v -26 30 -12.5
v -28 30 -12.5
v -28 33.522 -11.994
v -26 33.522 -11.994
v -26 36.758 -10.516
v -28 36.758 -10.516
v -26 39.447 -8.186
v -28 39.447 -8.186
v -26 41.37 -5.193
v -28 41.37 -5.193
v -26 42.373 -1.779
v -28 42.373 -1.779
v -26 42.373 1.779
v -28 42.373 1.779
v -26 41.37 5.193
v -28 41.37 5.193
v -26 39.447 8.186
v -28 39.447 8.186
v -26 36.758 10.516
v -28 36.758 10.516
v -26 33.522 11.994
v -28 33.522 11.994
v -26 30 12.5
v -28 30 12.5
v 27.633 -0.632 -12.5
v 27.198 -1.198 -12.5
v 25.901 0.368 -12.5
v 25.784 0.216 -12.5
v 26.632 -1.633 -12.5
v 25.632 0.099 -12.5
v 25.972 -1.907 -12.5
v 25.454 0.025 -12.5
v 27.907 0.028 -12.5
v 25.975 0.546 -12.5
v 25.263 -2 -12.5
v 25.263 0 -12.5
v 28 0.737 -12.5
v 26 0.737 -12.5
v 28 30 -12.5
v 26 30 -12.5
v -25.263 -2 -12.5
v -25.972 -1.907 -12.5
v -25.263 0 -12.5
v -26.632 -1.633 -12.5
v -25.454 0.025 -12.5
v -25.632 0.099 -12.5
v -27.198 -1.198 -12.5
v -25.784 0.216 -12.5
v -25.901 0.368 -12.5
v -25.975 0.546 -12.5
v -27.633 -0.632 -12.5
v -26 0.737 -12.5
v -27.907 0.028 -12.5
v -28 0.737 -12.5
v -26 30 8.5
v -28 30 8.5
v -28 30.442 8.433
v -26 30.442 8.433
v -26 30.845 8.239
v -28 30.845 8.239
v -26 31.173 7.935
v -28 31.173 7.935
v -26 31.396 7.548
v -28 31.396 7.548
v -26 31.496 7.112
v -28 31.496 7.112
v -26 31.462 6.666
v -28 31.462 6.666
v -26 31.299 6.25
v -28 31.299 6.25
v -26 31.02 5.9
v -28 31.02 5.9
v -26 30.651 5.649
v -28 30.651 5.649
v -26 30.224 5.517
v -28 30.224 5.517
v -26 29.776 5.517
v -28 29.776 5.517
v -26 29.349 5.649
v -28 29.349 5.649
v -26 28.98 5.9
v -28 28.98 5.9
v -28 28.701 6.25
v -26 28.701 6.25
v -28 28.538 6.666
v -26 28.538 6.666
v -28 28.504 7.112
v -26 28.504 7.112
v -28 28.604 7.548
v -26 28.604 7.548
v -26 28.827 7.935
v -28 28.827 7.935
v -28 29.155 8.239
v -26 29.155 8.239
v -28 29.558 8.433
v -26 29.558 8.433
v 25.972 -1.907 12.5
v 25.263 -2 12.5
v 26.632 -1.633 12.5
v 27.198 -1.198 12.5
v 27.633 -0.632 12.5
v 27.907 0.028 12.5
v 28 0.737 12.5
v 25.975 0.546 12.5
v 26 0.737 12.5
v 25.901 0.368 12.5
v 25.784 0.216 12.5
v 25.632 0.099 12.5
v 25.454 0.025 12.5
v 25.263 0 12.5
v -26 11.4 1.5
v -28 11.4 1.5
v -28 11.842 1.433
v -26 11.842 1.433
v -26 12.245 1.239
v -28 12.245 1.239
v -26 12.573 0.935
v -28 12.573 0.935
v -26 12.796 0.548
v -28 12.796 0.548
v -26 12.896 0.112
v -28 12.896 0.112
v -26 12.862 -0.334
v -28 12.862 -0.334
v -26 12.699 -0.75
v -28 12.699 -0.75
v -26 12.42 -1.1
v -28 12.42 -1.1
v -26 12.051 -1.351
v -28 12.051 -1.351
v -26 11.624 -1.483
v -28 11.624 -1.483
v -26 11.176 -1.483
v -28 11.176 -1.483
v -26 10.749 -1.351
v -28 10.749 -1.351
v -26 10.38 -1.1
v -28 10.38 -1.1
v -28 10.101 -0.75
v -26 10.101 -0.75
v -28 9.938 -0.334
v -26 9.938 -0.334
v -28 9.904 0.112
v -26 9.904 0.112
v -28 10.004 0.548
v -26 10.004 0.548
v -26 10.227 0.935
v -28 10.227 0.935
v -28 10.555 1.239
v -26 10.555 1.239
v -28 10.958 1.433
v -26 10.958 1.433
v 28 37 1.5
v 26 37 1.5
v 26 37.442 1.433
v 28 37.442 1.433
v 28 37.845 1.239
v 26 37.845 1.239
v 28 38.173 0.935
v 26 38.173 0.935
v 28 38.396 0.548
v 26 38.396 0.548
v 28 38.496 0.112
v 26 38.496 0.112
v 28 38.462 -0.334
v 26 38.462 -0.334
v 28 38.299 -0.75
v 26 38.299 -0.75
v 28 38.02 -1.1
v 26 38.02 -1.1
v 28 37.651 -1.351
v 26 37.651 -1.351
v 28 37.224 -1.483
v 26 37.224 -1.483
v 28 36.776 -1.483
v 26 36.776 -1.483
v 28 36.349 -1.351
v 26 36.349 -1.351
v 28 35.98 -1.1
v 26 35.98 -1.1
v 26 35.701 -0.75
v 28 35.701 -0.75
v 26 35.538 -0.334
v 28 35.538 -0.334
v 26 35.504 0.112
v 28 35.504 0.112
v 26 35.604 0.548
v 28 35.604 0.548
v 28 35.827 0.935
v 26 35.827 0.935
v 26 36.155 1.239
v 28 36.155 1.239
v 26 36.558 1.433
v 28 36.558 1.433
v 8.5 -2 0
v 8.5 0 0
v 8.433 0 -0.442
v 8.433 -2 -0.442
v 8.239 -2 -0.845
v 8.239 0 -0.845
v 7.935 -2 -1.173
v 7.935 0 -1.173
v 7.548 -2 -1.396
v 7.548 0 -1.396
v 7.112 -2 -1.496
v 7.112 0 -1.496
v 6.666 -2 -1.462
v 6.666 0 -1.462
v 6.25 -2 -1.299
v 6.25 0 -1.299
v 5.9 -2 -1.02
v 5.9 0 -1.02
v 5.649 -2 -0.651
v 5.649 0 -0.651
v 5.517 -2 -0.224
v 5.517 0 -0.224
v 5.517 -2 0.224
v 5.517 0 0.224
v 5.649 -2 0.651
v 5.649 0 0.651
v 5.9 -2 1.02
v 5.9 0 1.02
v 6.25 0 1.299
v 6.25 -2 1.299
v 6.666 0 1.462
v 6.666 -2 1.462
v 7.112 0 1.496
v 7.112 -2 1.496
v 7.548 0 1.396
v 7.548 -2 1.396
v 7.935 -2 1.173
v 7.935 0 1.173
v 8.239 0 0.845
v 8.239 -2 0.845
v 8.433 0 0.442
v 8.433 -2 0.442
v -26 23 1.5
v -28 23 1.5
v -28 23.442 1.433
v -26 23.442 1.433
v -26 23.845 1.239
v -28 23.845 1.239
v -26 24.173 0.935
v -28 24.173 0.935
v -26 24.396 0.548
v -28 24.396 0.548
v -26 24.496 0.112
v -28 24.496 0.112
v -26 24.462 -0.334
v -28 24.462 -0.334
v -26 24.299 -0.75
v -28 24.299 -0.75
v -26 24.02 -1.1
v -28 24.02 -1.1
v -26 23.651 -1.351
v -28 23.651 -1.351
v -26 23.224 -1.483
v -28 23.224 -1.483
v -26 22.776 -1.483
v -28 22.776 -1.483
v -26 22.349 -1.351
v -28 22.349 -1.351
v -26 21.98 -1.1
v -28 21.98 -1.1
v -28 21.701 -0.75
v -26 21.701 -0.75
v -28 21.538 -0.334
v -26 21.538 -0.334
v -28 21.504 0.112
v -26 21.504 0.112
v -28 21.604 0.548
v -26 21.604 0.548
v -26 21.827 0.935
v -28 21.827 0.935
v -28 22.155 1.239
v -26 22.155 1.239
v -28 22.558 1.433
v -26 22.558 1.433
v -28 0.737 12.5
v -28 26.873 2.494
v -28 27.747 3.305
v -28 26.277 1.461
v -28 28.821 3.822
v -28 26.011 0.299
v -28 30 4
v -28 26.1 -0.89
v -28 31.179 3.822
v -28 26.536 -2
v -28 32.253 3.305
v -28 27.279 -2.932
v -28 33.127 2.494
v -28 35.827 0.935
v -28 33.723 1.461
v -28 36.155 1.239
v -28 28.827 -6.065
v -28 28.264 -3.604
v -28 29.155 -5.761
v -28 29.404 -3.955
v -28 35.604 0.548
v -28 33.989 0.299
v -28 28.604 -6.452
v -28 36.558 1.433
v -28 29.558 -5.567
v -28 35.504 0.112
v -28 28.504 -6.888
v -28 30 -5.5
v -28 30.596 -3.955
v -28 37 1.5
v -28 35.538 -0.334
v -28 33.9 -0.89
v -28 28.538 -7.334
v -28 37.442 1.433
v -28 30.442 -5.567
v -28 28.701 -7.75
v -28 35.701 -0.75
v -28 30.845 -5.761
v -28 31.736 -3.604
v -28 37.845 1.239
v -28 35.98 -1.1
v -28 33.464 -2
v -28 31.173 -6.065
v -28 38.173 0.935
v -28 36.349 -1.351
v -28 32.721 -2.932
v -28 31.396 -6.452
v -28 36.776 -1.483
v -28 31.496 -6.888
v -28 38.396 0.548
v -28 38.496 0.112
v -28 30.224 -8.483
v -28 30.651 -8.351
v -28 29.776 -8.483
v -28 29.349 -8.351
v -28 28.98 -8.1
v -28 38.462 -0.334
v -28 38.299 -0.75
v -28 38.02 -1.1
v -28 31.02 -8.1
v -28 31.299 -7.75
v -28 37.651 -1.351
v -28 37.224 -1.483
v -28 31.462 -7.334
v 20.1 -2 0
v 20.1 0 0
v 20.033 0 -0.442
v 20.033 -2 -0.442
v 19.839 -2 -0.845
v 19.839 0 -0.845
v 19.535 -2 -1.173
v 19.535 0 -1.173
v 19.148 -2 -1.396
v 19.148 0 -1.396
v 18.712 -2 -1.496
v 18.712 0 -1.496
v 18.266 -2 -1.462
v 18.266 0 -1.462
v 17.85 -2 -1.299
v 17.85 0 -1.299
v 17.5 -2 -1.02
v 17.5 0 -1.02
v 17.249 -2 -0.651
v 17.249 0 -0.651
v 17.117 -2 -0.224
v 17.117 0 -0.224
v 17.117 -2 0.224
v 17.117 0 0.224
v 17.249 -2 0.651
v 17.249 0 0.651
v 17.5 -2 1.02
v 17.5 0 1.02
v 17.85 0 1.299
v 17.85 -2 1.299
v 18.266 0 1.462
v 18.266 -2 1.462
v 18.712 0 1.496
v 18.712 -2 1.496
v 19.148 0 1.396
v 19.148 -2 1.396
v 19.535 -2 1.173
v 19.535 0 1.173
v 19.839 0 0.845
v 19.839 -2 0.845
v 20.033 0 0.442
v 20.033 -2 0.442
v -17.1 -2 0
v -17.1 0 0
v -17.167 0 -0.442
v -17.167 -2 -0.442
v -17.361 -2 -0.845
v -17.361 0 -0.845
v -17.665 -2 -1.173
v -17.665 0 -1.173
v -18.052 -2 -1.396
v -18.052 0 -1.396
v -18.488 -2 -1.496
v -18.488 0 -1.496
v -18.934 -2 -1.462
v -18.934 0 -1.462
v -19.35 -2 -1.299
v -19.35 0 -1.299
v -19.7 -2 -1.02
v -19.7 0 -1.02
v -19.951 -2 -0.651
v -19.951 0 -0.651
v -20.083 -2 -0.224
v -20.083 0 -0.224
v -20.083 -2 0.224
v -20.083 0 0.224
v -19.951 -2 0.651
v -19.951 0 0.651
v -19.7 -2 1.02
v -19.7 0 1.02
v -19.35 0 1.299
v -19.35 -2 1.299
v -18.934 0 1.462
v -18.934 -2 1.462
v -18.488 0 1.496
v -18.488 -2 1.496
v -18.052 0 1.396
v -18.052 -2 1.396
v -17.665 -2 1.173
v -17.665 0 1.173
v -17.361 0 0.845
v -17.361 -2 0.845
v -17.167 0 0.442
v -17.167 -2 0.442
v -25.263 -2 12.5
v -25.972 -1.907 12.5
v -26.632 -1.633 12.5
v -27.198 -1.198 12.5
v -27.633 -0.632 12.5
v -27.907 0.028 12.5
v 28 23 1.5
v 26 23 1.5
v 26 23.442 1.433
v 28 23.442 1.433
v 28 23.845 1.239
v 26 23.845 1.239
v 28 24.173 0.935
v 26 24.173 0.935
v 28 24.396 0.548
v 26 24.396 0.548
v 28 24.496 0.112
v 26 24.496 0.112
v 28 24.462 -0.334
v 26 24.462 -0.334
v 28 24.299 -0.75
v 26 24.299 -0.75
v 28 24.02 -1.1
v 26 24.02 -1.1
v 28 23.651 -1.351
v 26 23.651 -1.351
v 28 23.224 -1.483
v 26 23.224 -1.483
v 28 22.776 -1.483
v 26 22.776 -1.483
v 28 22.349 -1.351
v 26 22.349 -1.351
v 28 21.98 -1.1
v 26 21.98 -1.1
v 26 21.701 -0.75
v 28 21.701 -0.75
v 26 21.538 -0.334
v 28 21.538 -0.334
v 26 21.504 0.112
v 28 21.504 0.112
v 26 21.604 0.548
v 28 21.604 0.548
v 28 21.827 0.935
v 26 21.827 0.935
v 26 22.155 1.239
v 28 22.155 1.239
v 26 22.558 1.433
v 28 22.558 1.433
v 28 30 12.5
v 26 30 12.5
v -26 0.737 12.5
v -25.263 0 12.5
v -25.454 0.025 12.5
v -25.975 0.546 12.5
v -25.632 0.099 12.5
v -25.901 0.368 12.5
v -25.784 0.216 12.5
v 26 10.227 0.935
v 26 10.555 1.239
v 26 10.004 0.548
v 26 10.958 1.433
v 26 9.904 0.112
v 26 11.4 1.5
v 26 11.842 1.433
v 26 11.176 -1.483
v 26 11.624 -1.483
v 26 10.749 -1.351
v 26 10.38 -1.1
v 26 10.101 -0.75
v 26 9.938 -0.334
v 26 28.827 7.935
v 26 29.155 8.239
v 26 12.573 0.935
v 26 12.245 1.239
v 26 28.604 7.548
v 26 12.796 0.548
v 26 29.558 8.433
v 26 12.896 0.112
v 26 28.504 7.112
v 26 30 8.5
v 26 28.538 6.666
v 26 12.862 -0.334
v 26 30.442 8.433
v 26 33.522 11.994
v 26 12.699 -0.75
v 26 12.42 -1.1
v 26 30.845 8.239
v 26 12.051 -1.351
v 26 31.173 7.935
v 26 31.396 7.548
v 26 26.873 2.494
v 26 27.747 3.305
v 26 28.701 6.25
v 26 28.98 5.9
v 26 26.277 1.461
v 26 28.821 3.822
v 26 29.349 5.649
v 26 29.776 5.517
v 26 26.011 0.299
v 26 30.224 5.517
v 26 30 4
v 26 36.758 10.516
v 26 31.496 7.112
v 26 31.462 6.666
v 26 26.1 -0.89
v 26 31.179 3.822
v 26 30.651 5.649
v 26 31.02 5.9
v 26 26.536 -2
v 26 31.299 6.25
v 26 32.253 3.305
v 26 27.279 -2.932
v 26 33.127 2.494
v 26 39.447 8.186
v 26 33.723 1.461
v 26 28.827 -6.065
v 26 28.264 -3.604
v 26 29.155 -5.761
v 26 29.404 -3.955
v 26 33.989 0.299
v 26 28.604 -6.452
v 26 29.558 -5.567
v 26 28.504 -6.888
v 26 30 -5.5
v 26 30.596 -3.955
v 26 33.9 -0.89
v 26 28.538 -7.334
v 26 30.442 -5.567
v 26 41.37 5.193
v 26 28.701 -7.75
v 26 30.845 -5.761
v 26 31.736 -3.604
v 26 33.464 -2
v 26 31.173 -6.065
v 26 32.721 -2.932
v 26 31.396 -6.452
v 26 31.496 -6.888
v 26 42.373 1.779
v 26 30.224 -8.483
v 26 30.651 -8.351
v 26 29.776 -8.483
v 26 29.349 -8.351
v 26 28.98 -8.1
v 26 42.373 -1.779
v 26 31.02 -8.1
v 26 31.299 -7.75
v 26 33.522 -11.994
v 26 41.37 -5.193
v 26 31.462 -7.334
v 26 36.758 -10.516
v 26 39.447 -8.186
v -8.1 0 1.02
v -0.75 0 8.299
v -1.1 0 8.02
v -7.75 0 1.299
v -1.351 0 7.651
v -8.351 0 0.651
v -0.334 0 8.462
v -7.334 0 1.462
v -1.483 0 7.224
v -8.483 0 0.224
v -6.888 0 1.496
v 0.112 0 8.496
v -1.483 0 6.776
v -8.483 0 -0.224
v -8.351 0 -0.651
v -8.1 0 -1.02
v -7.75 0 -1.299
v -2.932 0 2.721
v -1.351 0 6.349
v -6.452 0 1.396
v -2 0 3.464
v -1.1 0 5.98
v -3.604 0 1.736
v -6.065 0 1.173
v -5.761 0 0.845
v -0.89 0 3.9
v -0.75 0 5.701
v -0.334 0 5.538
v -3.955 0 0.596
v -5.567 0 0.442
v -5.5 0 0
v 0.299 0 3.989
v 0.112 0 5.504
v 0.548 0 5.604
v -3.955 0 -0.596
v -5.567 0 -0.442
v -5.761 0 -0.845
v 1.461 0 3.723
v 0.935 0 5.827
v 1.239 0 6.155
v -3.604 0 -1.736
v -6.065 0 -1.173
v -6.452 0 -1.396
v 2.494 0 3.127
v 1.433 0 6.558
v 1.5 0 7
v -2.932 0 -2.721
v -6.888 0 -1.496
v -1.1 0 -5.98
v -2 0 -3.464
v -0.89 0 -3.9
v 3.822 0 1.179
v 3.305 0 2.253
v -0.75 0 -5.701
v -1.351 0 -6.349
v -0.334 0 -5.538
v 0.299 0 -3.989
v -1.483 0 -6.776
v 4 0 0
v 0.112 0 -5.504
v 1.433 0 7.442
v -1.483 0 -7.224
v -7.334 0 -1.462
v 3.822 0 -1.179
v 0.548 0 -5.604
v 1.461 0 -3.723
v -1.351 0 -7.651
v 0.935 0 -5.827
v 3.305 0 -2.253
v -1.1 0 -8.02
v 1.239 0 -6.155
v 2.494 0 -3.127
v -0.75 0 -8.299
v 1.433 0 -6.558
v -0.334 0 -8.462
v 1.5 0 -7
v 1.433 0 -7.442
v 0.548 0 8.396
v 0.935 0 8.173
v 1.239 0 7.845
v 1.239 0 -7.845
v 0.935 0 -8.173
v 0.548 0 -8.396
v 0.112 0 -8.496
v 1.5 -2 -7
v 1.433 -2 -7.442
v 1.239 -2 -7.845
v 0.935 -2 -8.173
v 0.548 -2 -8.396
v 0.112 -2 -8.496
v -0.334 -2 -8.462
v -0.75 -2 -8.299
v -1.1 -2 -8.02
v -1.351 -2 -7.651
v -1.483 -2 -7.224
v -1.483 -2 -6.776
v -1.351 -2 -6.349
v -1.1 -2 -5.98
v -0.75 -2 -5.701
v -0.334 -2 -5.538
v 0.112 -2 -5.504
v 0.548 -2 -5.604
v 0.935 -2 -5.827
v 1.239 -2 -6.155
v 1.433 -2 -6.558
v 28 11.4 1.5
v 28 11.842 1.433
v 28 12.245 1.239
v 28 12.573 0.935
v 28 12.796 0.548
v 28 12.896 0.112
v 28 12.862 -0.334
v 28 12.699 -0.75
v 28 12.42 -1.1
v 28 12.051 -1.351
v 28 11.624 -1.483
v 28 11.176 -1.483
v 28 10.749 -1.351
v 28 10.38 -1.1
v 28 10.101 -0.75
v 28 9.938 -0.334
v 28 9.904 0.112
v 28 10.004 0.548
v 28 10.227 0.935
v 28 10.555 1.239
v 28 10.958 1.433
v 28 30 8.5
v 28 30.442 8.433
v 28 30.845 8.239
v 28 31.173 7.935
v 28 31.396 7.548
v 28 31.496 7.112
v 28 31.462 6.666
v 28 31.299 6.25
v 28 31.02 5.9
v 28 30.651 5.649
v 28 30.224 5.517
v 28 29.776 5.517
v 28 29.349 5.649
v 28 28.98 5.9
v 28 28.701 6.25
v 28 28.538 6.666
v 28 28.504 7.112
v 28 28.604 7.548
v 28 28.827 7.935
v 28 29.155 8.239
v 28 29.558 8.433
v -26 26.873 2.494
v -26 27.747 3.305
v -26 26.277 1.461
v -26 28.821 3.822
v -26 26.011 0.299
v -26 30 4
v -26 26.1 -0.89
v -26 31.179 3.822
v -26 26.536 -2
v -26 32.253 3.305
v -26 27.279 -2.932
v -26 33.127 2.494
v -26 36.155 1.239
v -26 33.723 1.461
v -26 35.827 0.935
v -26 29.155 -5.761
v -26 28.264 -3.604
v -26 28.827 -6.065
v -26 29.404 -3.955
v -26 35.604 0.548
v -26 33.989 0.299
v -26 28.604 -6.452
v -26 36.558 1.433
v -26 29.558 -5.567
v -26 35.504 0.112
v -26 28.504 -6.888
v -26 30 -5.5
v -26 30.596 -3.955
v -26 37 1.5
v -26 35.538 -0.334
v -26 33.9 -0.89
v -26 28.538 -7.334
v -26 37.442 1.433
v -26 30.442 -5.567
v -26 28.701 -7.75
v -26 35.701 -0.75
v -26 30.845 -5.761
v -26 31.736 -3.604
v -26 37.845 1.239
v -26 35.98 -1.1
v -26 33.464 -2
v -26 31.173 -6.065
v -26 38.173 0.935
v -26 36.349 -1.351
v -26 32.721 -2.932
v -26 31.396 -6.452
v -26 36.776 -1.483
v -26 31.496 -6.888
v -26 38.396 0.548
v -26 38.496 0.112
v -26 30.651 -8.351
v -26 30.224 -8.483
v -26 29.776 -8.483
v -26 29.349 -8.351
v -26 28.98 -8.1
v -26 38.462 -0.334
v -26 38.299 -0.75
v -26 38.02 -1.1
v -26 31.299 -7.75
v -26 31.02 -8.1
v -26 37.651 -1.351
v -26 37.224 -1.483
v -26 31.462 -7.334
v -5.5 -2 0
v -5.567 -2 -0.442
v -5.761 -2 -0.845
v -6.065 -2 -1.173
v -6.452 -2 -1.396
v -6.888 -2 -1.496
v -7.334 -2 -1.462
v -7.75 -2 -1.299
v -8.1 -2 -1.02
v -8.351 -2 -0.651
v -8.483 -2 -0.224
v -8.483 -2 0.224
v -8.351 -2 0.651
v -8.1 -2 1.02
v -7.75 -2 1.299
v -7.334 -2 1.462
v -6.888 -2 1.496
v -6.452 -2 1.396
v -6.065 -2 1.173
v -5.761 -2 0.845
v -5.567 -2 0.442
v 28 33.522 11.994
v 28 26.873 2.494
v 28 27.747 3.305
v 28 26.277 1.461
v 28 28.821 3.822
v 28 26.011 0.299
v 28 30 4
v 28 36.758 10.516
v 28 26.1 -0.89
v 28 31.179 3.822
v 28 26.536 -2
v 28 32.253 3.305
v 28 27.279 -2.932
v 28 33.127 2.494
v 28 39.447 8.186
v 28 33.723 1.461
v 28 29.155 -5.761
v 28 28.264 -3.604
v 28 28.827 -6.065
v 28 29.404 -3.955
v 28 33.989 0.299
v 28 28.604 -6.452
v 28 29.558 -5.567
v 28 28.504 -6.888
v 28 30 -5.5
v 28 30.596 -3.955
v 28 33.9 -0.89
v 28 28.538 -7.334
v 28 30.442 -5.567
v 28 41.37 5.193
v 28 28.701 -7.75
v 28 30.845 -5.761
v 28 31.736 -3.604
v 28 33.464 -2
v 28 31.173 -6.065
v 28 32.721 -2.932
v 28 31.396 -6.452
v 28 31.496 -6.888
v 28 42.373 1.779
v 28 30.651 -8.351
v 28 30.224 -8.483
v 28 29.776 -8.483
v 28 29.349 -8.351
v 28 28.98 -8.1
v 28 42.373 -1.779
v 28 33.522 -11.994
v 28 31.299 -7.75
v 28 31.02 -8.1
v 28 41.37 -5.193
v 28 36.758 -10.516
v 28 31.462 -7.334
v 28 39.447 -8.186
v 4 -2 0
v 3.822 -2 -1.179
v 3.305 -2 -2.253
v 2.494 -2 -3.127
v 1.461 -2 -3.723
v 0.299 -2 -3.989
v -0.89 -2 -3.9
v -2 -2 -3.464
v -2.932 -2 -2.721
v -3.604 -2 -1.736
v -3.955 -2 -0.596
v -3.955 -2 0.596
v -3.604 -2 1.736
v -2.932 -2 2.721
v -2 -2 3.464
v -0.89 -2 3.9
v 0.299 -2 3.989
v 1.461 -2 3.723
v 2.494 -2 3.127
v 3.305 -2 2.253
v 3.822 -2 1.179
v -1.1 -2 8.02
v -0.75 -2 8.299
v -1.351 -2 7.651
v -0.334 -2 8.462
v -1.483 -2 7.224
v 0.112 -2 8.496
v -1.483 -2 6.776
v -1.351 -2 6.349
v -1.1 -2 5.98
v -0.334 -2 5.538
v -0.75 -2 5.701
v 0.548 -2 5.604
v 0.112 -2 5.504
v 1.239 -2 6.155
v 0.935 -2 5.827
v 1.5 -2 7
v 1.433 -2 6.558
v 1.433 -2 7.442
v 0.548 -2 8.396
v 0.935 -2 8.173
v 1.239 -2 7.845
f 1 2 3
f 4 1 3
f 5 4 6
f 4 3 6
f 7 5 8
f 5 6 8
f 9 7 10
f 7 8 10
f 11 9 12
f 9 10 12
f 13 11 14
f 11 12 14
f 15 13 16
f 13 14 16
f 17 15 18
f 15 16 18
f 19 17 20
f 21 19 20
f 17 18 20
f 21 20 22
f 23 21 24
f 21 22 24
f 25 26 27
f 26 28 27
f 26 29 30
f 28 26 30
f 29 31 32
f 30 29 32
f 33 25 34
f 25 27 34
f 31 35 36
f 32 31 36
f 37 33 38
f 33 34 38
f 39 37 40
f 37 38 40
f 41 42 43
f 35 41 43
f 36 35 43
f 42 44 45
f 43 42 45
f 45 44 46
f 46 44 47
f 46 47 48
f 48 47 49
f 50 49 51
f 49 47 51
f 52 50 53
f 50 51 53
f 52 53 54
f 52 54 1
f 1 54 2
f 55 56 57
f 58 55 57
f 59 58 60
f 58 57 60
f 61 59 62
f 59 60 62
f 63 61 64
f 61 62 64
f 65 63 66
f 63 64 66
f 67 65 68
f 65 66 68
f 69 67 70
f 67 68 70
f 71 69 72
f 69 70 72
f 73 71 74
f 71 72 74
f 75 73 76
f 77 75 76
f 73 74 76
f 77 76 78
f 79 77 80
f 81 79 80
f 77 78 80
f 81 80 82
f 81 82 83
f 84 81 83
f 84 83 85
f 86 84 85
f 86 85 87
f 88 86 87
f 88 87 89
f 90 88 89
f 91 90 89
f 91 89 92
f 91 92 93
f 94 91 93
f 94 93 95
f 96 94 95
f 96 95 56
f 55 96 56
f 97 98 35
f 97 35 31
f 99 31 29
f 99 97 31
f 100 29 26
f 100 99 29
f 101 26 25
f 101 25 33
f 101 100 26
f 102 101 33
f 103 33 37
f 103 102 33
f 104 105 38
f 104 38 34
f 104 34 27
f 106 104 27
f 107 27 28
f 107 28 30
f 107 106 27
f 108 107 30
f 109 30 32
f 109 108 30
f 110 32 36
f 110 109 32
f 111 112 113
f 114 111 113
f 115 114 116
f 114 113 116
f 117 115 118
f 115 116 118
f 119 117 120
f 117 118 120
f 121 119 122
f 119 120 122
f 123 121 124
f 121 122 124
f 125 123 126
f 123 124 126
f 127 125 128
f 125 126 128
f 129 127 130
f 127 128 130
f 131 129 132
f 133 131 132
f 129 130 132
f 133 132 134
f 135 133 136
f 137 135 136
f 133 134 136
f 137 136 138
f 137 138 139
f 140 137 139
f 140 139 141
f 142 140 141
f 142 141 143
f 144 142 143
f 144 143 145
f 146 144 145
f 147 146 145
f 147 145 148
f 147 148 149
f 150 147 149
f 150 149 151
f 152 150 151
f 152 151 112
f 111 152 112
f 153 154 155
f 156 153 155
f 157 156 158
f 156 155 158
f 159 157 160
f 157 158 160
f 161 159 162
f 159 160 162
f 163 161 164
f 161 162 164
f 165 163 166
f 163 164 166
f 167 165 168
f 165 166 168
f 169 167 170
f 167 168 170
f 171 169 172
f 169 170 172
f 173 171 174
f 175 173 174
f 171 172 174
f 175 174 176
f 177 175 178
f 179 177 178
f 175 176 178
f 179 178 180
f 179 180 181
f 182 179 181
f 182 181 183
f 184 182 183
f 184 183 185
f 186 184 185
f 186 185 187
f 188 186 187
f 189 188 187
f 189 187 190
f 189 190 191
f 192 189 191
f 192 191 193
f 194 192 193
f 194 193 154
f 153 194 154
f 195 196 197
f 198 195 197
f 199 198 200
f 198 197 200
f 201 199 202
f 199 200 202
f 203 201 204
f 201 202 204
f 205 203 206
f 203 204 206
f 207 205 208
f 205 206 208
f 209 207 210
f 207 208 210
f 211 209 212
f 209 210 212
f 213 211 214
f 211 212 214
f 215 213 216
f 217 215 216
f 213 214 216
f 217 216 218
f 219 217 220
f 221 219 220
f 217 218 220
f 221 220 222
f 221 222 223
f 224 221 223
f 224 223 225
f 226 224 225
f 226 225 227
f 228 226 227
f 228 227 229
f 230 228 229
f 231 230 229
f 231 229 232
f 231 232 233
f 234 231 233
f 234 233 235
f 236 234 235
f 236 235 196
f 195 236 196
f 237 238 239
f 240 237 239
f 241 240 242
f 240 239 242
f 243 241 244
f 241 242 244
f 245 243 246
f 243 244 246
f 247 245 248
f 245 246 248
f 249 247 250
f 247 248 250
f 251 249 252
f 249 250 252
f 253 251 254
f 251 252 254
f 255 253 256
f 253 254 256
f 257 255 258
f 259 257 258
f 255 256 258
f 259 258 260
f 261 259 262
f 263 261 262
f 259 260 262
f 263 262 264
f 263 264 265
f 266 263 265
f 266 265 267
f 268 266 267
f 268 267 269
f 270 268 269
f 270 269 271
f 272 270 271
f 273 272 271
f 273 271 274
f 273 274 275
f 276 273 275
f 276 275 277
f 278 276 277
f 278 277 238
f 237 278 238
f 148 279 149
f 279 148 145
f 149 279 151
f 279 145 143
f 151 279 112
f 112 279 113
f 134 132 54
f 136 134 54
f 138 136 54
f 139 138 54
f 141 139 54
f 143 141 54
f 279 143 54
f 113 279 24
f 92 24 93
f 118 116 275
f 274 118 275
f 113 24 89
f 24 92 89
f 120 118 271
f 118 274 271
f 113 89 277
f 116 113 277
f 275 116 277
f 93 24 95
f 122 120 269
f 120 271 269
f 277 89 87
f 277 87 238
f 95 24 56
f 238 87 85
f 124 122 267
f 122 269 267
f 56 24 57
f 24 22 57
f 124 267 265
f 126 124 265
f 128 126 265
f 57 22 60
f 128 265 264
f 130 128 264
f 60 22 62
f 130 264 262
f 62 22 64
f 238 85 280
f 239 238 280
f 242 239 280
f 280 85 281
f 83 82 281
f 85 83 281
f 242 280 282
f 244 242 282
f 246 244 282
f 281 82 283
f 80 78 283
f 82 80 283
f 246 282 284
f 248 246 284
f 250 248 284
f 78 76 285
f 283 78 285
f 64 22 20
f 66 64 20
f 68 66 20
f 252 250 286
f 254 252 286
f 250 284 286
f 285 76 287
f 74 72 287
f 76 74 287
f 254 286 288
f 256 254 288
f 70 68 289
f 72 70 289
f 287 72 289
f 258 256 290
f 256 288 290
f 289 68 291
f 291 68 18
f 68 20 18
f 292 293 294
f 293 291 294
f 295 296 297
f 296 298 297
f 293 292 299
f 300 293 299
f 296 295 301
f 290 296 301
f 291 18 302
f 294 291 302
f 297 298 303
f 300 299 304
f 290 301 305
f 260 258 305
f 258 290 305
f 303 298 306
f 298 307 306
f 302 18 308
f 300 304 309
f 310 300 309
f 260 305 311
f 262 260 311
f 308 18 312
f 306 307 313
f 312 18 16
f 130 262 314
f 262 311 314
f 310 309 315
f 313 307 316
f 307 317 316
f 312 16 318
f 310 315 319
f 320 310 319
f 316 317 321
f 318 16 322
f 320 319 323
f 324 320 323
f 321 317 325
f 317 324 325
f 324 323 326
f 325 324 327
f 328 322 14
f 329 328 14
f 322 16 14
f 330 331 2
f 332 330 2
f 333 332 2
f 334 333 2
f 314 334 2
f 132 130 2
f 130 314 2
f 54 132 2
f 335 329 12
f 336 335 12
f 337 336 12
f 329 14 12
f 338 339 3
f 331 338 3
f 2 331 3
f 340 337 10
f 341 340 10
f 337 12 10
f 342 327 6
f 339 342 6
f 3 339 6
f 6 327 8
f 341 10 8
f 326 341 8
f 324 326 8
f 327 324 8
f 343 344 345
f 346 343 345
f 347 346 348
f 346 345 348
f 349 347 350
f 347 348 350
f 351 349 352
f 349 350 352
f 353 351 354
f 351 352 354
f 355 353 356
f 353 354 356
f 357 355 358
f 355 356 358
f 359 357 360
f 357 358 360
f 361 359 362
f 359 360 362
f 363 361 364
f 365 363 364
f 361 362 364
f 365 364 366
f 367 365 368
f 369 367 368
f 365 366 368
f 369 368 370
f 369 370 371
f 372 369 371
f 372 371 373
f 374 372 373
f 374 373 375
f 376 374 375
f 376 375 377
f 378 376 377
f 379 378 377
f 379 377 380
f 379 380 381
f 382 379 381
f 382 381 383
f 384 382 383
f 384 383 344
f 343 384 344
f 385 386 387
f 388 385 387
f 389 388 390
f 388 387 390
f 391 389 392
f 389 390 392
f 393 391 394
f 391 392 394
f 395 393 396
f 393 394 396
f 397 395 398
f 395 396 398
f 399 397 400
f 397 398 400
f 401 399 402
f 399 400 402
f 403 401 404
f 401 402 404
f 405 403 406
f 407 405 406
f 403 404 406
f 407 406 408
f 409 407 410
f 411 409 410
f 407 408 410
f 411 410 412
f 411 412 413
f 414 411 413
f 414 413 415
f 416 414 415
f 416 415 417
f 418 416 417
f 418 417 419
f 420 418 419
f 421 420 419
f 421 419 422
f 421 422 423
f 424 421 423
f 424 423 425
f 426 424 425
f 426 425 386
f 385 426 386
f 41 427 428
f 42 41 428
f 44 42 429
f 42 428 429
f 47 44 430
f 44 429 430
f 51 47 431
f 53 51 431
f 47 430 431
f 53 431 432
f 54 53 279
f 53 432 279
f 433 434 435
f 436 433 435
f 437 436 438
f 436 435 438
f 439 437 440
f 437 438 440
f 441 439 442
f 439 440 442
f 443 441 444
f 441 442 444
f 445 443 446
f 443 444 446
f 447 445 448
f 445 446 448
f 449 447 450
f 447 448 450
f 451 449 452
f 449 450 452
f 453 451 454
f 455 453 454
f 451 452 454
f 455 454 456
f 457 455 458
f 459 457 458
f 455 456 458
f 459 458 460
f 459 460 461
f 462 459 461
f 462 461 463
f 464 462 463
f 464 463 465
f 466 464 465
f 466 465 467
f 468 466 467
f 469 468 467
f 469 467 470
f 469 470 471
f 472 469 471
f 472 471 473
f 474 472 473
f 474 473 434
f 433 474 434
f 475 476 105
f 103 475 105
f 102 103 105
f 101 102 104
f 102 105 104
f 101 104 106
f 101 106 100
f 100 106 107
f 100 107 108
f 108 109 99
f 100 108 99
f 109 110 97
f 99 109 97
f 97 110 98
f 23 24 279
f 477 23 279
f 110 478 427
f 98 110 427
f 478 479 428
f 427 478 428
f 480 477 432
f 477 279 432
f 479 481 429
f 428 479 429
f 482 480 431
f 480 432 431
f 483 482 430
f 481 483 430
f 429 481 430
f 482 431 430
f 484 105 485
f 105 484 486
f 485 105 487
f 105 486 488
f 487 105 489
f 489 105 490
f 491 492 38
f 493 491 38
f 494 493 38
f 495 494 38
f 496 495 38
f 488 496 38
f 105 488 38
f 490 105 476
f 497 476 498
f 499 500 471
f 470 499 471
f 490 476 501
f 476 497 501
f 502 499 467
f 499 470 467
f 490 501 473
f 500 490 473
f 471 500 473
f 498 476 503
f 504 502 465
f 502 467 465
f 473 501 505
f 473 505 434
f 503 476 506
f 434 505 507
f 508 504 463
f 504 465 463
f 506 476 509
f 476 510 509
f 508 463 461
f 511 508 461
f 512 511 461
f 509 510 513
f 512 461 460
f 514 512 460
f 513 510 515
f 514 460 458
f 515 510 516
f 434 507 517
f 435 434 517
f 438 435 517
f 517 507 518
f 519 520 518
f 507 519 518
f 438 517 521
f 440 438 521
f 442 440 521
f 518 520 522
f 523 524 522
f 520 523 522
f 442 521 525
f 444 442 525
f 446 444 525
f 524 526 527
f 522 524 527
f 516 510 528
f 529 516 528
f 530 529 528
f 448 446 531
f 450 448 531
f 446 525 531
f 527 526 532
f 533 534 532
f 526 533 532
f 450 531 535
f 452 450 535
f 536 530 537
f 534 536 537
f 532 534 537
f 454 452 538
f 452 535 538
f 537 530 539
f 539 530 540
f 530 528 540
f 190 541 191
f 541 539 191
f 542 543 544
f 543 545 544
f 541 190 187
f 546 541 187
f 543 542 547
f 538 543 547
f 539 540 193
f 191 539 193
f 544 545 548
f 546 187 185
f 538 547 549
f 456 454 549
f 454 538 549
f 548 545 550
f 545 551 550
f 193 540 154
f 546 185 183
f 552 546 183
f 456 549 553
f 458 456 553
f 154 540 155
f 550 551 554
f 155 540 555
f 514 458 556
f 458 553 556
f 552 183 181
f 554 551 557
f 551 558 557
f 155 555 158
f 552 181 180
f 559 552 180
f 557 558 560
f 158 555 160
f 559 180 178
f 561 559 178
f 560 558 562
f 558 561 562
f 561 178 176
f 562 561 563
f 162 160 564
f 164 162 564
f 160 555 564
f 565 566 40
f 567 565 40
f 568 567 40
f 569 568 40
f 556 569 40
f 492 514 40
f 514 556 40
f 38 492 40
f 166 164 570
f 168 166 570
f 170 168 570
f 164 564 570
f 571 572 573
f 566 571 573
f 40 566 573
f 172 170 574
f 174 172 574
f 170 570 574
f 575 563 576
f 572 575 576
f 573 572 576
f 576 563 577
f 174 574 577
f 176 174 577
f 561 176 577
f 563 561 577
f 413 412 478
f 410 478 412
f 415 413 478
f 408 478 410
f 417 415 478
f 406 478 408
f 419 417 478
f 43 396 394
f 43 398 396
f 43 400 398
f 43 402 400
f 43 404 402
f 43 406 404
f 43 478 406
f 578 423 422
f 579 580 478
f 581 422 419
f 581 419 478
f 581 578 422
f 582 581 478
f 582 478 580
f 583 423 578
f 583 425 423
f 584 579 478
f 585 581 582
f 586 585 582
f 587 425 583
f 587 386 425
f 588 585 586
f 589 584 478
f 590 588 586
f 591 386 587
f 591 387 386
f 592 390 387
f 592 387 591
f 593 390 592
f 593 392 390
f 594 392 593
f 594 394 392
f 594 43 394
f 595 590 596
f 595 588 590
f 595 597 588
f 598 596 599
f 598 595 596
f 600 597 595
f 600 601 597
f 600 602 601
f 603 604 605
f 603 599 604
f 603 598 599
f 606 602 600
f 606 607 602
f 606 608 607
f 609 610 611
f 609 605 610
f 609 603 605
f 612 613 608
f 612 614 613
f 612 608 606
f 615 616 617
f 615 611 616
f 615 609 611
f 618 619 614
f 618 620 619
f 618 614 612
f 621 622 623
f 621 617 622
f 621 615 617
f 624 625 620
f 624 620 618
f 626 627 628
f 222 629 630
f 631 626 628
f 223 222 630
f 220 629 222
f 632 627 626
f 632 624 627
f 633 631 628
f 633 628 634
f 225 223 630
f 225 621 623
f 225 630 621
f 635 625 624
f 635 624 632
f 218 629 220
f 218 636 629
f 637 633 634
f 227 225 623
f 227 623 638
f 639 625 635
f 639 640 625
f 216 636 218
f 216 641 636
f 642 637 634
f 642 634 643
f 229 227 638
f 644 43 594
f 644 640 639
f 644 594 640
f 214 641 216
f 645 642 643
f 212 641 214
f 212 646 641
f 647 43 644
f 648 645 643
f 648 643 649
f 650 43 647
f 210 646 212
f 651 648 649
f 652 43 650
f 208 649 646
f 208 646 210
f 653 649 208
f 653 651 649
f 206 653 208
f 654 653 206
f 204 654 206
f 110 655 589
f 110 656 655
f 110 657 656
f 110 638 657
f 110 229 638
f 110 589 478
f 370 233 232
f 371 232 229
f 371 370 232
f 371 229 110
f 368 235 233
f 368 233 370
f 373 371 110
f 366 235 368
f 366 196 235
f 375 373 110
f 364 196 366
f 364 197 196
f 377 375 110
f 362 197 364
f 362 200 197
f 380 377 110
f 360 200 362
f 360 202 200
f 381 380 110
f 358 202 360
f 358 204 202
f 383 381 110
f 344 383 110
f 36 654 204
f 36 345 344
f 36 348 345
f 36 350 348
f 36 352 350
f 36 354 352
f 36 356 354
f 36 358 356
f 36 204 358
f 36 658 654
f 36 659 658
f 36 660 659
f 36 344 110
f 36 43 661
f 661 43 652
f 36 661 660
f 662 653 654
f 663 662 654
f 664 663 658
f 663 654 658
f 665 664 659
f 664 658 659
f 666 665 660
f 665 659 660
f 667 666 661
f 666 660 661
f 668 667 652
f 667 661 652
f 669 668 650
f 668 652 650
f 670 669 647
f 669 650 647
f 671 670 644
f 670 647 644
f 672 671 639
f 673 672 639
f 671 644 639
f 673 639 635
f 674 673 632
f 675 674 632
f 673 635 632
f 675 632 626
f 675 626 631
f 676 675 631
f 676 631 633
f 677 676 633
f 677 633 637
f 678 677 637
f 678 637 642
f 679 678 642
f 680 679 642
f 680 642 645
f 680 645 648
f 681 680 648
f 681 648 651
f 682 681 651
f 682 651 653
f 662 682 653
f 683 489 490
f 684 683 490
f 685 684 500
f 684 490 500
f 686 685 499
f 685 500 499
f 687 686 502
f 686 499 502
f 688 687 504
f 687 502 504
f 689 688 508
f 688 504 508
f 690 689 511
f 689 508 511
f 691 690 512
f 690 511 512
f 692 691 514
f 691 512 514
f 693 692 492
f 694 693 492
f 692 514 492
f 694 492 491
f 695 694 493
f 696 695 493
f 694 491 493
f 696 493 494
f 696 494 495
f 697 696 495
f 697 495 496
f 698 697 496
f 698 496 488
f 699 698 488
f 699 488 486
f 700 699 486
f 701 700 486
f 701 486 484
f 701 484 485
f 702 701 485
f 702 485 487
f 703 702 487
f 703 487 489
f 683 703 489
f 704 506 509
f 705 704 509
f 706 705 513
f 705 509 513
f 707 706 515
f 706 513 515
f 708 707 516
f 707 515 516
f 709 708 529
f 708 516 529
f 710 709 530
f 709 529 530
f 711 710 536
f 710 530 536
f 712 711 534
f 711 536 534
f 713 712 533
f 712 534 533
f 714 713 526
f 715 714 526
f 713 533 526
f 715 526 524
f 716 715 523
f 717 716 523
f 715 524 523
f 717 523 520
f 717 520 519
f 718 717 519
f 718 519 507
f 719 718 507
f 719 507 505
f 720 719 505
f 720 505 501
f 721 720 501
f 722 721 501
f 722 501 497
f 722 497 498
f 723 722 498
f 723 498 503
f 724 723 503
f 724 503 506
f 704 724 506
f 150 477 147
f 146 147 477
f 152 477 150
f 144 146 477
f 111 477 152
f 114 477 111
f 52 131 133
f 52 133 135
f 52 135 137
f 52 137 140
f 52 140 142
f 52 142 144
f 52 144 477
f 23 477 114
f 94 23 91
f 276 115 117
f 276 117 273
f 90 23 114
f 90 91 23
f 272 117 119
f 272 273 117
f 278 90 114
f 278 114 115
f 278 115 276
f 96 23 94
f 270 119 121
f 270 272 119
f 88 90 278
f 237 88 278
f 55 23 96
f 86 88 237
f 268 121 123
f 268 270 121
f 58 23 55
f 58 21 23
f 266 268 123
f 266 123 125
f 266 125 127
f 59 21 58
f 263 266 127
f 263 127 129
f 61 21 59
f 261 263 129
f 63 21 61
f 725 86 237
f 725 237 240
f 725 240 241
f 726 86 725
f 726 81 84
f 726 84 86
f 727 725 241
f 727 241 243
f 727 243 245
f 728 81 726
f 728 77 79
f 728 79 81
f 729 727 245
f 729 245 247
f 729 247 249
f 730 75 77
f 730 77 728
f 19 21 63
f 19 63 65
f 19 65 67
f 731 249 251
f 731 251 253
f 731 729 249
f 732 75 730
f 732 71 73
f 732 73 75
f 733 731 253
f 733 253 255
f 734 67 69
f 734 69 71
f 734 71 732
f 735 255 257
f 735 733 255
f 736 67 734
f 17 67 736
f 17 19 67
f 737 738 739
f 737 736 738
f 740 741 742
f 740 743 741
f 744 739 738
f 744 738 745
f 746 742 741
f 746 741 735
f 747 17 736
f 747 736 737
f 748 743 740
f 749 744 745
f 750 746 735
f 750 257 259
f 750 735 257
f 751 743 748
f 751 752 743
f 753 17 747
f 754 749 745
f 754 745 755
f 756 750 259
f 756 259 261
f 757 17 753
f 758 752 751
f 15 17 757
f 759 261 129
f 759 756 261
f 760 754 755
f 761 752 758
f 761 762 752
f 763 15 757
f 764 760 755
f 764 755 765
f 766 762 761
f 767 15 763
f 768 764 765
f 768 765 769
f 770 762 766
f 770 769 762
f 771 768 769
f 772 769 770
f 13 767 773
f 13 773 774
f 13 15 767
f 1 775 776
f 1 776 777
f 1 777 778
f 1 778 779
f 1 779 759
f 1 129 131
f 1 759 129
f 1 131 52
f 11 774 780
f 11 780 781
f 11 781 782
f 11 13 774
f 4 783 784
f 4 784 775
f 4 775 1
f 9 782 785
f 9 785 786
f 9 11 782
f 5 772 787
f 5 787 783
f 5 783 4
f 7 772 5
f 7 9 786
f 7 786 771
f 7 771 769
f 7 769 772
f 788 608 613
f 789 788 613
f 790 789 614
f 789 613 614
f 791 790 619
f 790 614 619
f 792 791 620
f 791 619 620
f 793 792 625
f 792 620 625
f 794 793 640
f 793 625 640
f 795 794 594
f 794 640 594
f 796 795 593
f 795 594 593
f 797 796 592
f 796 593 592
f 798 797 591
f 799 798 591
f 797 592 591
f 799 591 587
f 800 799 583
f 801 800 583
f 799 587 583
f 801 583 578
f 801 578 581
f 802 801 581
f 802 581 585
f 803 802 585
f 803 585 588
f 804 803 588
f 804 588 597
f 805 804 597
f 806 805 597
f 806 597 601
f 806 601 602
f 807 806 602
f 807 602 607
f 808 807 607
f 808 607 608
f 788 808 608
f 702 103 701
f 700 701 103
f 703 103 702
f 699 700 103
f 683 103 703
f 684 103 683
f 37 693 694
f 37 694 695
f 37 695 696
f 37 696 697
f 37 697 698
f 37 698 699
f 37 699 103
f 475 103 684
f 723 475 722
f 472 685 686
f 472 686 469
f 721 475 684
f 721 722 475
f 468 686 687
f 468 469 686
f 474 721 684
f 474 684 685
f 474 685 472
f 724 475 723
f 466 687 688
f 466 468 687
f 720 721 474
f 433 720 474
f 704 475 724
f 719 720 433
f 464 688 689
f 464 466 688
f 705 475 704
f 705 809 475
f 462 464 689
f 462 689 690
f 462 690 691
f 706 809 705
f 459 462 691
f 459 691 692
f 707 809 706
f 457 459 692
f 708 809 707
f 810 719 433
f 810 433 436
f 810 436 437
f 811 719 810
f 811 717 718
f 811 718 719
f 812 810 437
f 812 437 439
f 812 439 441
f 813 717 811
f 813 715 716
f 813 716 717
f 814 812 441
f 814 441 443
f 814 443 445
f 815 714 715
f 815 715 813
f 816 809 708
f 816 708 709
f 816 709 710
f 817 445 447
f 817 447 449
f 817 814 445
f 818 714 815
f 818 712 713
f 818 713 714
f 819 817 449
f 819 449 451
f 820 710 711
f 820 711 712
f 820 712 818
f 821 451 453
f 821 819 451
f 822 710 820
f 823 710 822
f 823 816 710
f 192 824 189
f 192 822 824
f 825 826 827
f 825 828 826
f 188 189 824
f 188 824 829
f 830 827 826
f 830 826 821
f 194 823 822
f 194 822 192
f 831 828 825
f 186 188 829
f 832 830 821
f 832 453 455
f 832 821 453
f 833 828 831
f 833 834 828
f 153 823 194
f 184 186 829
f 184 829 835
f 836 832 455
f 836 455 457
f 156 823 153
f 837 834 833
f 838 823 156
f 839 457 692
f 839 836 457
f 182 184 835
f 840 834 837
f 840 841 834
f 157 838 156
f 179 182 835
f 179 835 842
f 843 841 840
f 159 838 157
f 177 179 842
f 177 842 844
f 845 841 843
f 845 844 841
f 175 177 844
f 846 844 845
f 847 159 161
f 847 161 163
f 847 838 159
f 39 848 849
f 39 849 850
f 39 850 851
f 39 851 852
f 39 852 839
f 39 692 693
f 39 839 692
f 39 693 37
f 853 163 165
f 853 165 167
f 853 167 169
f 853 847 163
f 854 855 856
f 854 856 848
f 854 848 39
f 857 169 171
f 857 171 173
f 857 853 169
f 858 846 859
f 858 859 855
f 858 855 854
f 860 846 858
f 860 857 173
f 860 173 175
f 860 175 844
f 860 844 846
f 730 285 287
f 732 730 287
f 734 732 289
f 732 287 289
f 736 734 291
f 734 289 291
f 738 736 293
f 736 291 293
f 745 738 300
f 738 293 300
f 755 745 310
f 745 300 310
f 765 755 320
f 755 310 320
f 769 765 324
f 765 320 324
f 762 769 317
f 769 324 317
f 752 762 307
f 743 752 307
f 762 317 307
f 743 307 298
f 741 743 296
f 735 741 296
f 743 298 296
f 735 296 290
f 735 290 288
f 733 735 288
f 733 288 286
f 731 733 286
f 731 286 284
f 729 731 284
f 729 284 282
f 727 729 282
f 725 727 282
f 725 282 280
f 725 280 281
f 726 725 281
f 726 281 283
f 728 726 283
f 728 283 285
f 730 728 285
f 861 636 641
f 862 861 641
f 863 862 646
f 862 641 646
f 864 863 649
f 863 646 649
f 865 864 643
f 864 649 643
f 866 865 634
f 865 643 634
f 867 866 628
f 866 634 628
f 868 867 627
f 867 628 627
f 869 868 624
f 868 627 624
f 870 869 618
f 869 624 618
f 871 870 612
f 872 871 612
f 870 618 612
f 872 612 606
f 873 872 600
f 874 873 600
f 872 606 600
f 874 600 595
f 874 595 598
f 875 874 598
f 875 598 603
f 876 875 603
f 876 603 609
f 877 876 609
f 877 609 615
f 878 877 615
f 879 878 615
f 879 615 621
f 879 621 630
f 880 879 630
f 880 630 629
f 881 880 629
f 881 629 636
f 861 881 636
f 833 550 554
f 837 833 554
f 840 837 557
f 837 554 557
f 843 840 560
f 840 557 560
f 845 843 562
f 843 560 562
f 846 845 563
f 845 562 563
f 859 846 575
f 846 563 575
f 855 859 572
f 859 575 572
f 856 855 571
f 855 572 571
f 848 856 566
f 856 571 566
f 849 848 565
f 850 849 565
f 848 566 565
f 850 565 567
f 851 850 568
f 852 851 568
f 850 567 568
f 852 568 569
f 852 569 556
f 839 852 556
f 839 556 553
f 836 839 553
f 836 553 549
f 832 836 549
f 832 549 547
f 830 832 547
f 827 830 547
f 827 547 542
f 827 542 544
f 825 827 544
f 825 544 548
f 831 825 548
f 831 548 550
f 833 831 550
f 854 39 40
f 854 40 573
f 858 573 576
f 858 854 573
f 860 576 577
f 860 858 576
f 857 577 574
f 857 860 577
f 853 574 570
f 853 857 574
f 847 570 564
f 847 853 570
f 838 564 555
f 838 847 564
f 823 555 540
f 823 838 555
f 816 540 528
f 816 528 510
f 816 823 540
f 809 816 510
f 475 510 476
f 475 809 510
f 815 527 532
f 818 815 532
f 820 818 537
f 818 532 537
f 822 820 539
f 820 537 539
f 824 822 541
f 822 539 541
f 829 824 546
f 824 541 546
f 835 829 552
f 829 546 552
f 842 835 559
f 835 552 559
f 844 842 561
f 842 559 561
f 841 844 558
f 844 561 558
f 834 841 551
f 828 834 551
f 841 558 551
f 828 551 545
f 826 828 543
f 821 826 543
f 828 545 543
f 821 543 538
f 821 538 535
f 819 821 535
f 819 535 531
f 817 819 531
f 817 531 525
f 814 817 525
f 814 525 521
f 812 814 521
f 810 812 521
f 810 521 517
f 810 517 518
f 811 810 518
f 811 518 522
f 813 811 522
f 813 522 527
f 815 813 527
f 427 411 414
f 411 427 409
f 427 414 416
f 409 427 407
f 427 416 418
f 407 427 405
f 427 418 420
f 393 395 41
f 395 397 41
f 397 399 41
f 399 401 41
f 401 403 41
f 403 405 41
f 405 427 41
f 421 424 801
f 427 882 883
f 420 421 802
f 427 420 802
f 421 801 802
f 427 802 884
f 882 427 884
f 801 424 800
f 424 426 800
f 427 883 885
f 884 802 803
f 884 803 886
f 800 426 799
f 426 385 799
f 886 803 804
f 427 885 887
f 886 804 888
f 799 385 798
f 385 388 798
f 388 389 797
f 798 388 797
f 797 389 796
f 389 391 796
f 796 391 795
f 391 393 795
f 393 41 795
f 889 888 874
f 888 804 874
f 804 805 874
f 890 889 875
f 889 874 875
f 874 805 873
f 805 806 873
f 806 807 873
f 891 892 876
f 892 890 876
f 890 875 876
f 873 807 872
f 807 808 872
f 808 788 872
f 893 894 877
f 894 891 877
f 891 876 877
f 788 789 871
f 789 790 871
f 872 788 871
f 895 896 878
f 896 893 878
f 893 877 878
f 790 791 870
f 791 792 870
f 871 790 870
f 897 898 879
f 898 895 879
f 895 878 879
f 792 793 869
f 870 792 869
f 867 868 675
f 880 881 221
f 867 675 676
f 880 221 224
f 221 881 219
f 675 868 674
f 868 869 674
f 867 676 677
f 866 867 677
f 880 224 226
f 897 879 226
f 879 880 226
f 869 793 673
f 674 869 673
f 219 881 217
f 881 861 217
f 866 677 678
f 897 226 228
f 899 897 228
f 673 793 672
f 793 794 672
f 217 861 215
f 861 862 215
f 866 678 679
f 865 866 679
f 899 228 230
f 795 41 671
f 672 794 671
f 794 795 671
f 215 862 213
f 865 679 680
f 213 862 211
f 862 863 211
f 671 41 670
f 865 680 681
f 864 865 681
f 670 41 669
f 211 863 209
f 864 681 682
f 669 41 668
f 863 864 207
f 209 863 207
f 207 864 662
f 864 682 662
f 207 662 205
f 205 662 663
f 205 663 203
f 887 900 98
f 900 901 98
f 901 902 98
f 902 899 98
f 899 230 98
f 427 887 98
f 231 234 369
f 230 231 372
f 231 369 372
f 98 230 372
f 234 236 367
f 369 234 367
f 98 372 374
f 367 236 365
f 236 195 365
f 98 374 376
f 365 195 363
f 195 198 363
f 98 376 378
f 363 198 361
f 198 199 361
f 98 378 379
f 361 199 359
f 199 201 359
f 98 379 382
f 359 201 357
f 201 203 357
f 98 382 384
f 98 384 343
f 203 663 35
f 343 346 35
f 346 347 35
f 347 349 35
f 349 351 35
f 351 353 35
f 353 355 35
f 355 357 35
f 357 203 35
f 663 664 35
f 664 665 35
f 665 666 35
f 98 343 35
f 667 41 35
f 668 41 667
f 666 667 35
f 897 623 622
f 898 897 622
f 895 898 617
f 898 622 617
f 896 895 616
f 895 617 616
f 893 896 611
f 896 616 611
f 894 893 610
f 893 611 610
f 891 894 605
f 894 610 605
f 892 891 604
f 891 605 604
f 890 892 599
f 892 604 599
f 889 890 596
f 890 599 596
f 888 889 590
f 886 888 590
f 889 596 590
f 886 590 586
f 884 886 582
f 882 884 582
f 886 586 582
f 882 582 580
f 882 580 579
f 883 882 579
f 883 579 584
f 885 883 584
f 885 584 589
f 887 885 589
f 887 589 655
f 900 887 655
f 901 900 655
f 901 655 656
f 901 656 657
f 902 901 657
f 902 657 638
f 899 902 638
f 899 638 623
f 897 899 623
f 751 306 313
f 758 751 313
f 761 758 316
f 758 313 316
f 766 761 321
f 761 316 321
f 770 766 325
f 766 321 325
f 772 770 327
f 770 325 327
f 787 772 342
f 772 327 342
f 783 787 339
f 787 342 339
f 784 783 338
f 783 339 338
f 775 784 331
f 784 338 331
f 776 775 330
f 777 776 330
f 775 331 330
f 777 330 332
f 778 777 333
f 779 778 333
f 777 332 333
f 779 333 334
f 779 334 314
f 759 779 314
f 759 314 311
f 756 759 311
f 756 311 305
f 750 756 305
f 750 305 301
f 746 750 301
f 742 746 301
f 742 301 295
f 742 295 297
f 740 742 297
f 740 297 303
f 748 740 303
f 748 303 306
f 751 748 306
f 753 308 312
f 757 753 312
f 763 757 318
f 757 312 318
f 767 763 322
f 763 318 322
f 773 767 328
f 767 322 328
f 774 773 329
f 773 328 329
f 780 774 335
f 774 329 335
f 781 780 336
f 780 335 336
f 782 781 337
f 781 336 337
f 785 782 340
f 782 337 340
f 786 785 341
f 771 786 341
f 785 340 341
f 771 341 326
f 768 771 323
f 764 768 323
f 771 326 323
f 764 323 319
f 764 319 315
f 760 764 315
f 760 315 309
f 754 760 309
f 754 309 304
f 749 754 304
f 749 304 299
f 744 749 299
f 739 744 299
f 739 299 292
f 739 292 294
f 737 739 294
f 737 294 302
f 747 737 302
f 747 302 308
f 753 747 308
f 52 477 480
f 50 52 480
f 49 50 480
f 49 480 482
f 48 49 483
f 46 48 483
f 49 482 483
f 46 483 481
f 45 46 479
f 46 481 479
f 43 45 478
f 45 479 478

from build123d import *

# Parameters (mm, degrees)
SKETCH_1_W                       = 52
SKETCH_1_H                       = 25
SM_BASE_FLANGE_1_DEPTH           = 2
SM_EDGE_FLANGE_1_STRIP_W         = 9.4732
SM_EDGE_FLANGE_1_STRIP_H         = 2
SM_EDGE_FLANGE_1_STRIP_CUT_DEPTH = 25
SM_EDGE_FLANGE_1_DEPTH           = 25
SM_START                         = 2
SM_EDGE_FLANGE_1_FLAT_DEPTH      = 2
HOLE_WIZARD_3_0_3_1_D            = 3
HOLE_WIZARD_8_0_8_1_D            = 8
HOLE_WIZARD_3_0_3_2_D            = 3
HOLE_WIZARD_8_0_8_2_D            = 8


# Sheet-metal steps are written as plain solids
with BuildPart() as part:
    # Sketch 1 → 基体-法兰1 (new body)
    with BuildSketch(Plane(origin=(0, 0, 0), x_dir=(1, 0, 0), z_dir=(0, 1, 0))):
        Rectangle(SKETCH_1_W, SKETCH_1_H)
    extrude(amount=-SM_BASE_FLANGE_1_DEPTH)

    # 边线-法兰1 strip (across the edge) → 边线-法兰1 strip cut (cut)
    with BuildSketch(Plane(origin=(26, 0, 12.5), x_dir=(-1, 0, 0), z_dir=(0, 0, -1))):
        with Locations((-4, -1)):
            Rectangle(SM_EDGE_FLANGE_1_STRIP_W, SM_EDGE_FLANGE_1_STRIP_H)
    sm_edge_flange_1_strip_cut = extrude(amount=SM_EDGE_FLANGE_1_STRIP_CUT_DEPTH, mode=Mode.SUBTRACT)

    # 边线-法兰1 bend section (across the edge) → 边线-法兰1 (add)
    with BuildSketch(Plane(origin=(26, 0, 12.5), x_dir=(-1, 0, 0), z_dir=(0, 0, -1))):
        with BuildLine():
            Line((-2, 0.7366), (0, 0.7366))
            ThreePointArc((0, 0.7366), (0.215745145, 0.215745145), (0.7366, 0))
            Line((0.7366, 0), (0.7366, -2))
            ThreePointArc((0.7366, -2), (-1.198468417, -1.198468417), (-2, 0.7366))
        make_face()
    sm_edge_flange_1 = extrude(amount=SM_EDGE_FLANGE_1_DEPTH)

    # 边线-法兰1 profile (on flange) → 边线-法兰1 flat (add)
    with BuildSketch(Plane(origin=(26, 0, 0), x_dir=(0, 0, -1), z_dir=(1, 0, 0)).offset(SM_START)):
        with BuildLine():
            Line((-12.5, 30), (-12.5, 0.7366))
            Line((-12.5, 0.7366), (12.5, 0.7366))
            Line((12.5, 0.7366), (12.5, 30))
            ThreePointArc((12.5, 30), (0, 42.5), (-12.5, 30))
        make_face()
    sm_edge_flange_1_flat = extrude(amount=-SM_EDGE_FLANGE_1_FLAT_DEPTH)

    # 镜向1: 边线-法兰1 strip cut, 边线-法兰1, 边线-法兰1 flat across plane
    add(sm_edge_flange_1_strip_cut.mirror(Plane(origin=(0, 0, 0), x_dir=(0, 0, 1), z_dir=(1, 0, 0))), mode=Mode.SUBTRACT)
    add(sm_edge_flange_1.mirror(Plane(origin=(0, 0, 0), x_dir=(0, 0, 1), z_dir=(1, 0, 0))))
    add(sm_edge_flange_1_flat.mirror(Plane(origin=(0, 0, 0), x_dir=(0, 0, 1), z_dir=(1, 0, 0))))

    # Ø3.0 (3) 直径孔1 (through all)
    with Locations(Plane(origin=(0, -2, 0), x_dir=(-1, 0, 0), z_dir=(0, -1, 0))):
        with Locations((0, -7), (0, 7), (-7, 0), (7, 0), (18.6, 0), (-18.6, 0)):
            Hole(HOLE_WIZARD_3_0_3_1_D / 2)

    # Ø8.0 (8) 直径孔1 (through all)
    with Locations(Plane(origin=(0, -2, 0), x_dir=(-1, 0, 0), z_dir=(0, -1, 0))):
        with Locations((0, 0)):
            Hole(HOLE_WIZARD_8_0_8_1_D / 2)

    # Ø3.0 (3) 直径孔2 (through all)
    with Locations(Plane(origin=(28, 0, 0), x_dir=(0, 0, -1), z_dir=(1, 0, 0))):
        with Locations((0, 11.4), (0, 37), (7, 30), (-7, 30), (0, 23)):
            Hole(HOLE_WIZARD_3_0_3_2_D / 2)

    # Ø8.0 (8) 直径孔2 (through all)
    with Locations(Plane(origin=(28, 0, 0), x_dir=(0, 0, -1), z_dir=(1, 0, 0))):
        with Locations((0, 30)):
            Hole(HOLE_WIZARD_8_0_8_2_D / 2)


solid = part.part
